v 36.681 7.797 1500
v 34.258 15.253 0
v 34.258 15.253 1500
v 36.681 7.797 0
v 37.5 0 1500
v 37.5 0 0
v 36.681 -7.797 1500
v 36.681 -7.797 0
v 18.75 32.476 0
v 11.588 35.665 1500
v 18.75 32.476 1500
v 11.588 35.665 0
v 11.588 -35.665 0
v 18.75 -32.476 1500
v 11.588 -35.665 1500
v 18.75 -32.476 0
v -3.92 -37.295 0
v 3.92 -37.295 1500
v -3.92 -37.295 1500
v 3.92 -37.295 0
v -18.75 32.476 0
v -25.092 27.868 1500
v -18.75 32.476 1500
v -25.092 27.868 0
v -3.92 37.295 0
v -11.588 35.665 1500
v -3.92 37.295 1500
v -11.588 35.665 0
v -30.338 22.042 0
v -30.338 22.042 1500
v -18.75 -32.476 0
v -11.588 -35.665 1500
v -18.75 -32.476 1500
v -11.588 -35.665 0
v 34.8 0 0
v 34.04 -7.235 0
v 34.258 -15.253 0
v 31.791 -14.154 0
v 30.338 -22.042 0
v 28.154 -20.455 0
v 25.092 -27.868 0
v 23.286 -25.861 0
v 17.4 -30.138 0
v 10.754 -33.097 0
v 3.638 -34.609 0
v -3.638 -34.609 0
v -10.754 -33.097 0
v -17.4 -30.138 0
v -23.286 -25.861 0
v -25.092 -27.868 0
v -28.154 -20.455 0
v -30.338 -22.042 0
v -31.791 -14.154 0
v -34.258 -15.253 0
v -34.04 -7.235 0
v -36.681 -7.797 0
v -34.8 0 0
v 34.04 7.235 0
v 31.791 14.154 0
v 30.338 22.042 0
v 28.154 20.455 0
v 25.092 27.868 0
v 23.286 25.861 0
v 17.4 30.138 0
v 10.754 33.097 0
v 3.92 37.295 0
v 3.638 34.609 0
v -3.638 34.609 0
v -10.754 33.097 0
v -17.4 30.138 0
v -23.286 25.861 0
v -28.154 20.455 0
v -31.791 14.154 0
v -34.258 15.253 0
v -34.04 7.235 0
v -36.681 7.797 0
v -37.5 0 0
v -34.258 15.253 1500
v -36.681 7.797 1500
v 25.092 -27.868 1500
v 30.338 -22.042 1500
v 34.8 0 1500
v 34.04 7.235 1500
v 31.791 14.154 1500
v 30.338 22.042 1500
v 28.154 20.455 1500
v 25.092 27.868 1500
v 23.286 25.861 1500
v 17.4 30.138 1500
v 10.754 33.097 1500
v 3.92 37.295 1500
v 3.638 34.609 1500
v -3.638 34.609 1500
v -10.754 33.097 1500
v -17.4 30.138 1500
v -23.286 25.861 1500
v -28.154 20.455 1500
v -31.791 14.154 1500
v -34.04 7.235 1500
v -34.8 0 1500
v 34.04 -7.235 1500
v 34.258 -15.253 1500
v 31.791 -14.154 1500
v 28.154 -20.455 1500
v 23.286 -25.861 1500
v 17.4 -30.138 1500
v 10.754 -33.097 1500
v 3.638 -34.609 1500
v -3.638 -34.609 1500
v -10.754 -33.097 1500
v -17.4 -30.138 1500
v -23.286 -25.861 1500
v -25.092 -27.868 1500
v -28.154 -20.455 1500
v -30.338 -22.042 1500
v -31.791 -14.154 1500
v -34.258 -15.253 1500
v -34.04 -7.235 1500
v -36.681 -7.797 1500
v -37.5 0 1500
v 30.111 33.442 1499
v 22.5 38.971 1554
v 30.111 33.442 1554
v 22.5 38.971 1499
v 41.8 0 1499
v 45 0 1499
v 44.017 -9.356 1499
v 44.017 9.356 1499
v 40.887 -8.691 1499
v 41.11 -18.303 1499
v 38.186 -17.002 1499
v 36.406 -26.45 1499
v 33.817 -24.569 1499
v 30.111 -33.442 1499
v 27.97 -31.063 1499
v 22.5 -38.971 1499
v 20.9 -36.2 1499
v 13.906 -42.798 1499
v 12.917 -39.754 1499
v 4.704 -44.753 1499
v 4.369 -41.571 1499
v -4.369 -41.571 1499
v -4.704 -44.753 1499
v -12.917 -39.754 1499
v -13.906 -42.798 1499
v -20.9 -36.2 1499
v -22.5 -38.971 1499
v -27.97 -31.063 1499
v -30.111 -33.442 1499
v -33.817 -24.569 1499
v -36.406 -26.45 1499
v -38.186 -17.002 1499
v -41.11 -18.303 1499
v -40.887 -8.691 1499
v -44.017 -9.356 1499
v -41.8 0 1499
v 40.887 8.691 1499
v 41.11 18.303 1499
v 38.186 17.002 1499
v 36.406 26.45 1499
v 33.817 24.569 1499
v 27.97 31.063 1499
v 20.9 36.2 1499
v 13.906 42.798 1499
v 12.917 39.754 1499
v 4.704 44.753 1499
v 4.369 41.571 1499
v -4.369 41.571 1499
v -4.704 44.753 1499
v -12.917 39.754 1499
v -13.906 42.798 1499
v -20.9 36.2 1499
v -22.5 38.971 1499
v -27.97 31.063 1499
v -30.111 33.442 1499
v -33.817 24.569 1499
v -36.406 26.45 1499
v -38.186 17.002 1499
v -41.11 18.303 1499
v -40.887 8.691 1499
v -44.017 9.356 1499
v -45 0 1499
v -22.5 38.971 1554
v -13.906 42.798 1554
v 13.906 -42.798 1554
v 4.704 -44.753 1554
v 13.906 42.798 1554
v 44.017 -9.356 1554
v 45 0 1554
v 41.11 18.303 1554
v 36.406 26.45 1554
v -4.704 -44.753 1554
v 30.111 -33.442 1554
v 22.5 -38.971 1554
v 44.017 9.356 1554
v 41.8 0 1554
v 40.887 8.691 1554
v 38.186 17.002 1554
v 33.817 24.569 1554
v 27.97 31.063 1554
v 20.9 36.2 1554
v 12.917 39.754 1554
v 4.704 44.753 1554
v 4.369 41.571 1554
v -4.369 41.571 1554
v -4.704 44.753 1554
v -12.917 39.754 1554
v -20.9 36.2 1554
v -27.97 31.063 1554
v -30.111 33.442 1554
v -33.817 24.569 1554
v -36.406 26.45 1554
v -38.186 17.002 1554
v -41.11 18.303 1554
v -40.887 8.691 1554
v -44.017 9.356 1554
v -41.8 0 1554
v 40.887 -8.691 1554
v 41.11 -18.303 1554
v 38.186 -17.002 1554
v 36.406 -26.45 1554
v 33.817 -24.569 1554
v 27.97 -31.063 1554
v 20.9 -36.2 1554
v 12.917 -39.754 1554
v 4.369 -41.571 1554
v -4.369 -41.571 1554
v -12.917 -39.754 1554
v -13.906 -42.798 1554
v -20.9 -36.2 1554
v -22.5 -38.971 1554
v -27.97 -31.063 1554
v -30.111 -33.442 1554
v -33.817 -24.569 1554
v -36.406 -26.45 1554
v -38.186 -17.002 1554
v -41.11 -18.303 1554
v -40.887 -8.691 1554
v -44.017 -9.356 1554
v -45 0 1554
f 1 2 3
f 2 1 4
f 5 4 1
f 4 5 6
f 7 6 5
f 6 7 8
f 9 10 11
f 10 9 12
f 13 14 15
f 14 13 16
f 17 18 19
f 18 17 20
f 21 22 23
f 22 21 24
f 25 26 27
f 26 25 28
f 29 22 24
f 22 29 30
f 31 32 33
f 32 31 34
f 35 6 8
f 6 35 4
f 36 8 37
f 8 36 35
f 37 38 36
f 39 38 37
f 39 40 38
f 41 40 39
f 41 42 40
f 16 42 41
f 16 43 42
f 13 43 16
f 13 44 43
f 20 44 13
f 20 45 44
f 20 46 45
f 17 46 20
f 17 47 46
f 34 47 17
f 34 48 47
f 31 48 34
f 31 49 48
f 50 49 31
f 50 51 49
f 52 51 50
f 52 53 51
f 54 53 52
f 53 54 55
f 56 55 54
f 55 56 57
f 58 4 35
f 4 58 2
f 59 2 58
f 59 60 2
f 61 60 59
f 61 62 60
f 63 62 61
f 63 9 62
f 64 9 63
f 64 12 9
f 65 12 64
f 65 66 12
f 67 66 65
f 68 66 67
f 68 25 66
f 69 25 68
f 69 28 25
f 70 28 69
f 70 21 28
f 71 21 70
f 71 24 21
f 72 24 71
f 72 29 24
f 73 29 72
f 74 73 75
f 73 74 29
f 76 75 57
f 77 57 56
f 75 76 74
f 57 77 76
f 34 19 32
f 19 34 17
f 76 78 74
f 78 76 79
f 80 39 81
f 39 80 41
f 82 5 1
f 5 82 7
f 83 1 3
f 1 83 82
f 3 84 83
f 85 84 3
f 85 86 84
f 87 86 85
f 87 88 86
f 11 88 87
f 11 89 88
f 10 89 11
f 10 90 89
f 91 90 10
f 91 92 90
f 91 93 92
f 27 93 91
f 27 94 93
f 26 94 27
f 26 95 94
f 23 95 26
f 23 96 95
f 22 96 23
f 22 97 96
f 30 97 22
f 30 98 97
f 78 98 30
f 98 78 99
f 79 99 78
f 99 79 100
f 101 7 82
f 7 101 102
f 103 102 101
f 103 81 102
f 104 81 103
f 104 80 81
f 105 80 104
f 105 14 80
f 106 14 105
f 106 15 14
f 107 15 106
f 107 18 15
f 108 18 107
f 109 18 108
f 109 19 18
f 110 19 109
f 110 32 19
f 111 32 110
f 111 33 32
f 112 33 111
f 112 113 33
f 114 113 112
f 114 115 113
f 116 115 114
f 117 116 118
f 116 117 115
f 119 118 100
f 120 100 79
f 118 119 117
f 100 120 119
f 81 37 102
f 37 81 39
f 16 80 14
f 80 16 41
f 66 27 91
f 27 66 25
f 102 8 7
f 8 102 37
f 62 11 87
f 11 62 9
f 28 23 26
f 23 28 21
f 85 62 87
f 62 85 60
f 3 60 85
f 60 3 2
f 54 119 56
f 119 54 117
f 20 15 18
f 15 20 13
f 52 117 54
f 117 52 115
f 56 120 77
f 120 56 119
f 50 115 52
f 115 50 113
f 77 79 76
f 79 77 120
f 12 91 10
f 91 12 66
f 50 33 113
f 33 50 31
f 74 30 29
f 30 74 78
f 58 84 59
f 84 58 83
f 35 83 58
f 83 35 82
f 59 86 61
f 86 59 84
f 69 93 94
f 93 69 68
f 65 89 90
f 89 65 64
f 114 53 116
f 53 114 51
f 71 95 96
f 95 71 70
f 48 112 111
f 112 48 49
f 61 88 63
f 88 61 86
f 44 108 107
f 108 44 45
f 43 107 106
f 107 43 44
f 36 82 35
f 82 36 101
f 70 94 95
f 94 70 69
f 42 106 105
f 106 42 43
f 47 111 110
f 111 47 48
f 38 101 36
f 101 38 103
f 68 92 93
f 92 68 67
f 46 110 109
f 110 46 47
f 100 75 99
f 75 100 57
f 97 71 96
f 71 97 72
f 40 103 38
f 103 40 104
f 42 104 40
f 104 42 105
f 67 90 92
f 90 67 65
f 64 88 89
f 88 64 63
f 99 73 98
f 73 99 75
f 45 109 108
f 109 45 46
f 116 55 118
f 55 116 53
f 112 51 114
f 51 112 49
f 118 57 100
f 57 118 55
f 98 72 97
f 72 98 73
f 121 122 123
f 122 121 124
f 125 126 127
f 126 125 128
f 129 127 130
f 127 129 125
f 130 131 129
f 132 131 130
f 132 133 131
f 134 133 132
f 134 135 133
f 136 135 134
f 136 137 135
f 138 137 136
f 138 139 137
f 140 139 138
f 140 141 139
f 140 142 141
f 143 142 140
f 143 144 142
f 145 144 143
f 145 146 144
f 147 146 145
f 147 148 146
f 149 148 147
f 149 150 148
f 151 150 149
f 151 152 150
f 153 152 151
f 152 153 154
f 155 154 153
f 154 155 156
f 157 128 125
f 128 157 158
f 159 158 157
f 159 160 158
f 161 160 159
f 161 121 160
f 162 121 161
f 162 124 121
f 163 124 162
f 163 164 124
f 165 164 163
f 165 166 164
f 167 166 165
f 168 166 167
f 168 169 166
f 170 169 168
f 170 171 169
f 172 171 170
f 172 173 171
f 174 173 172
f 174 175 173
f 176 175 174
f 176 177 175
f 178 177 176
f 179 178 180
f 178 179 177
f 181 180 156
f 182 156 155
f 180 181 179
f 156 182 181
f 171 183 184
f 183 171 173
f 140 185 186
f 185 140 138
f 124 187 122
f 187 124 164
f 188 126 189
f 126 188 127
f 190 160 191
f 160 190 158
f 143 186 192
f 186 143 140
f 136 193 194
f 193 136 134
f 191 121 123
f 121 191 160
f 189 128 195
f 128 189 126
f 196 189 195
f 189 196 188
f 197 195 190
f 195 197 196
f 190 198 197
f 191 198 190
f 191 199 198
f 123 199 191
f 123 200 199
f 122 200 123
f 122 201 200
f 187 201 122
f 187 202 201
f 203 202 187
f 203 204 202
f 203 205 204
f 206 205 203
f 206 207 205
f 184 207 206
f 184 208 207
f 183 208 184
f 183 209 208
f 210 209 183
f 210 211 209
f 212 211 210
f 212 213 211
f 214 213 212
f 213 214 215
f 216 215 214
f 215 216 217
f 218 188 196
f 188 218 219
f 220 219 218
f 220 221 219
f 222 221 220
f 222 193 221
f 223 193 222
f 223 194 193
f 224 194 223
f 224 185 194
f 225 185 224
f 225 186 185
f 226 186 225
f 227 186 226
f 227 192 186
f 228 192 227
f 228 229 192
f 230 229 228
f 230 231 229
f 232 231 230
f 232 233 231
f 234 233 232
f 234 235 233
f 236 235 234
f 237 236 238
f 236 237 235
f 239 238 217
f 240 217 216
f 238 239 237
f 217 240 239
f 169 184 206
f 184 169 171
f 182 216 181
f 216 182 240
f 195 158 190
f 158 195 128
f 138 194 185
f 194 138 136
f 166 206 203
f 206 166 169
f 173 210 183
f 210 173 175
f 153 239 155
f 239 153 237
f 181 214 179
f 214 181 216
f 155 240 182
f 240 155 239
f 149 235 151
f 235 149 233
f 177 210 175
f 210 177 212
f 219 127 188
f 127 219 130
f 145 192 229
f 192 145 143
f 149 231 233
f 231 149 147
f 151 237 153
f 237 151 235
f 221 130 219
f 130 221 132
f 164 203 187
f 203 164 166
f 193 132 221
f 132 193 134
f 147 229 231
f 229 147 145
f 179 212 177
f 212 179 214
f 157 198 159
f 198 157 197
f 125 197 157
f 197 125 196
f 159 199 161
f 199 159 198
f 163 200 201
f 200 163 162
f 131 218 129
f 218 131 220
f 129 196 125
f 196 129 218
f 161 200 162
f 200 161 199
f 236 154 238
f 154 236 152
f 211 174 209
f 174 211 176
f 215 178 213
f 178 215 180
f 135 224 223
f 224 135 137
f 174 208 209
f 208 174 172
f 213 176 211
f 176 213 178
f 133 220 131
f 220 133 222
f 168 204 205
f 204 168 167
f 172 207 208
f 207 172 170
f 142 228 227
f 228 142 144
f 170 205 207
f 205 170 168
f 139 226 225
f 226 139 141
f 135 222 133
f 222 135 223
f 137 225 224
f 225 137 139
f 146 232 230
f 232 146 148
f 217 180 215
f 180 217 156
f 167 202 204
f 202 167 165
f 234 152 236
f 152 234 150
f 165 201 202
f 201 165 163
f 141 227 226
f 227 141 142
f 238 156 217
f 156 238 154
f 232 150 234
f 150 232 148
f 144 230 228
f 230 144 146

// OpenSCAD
// Parameters
length_mm = 1500; //[750:3000:10]
ht75_outer_diameter_mm = 75; //[60:90:1]
ht75_wall_thickness_mm = 2.7; //[1.5:5.4:0.1]
include_end_fitting = 1; //[0:1:1]
fitting_length_mm = 55; //[30:120:1]
fitting_outer_diameter_mm = 90; //[80:110:1]
fitting_wall_thickness_mm = 3.2; //[2:6:0.1]
connection_overlap_mm = 1; //[0.5:2:0.1]

// HT Pipe - complete geometry
module ht_pipe() {
  color([0.85, 0.85, 0.8]) { // PVC color
    // Pipe body
    difference() {
      cylinder(h=length_mm, r=ht75_outer_diameter_mm/2, center=false);
      translate([0, 0, 0])
        cylinder(h=length_mm, r=ht75_outer_diameter_mm/2 - ht75_wall_thickness_mm, center=false);
    }
    
    // End fitting (if included)
    if (include_end_fitting) {
      translate([0, 0, length_mm - connection_overlap_mm])
        difference() {
          cylinder(h=fitting_length_mm, r=fitting_outer_diameter_mm/2, center=false);
          translate([0, 0, 0])
            cylinder(h=fitting_length_mm, r=fitting_outer_diameter_mm/2 - fitting_wall_thickness_mm, center=false);
        }
    }
  }
}

// Assembly
module assembly() {
  ht_pipe();
}

assembly();
